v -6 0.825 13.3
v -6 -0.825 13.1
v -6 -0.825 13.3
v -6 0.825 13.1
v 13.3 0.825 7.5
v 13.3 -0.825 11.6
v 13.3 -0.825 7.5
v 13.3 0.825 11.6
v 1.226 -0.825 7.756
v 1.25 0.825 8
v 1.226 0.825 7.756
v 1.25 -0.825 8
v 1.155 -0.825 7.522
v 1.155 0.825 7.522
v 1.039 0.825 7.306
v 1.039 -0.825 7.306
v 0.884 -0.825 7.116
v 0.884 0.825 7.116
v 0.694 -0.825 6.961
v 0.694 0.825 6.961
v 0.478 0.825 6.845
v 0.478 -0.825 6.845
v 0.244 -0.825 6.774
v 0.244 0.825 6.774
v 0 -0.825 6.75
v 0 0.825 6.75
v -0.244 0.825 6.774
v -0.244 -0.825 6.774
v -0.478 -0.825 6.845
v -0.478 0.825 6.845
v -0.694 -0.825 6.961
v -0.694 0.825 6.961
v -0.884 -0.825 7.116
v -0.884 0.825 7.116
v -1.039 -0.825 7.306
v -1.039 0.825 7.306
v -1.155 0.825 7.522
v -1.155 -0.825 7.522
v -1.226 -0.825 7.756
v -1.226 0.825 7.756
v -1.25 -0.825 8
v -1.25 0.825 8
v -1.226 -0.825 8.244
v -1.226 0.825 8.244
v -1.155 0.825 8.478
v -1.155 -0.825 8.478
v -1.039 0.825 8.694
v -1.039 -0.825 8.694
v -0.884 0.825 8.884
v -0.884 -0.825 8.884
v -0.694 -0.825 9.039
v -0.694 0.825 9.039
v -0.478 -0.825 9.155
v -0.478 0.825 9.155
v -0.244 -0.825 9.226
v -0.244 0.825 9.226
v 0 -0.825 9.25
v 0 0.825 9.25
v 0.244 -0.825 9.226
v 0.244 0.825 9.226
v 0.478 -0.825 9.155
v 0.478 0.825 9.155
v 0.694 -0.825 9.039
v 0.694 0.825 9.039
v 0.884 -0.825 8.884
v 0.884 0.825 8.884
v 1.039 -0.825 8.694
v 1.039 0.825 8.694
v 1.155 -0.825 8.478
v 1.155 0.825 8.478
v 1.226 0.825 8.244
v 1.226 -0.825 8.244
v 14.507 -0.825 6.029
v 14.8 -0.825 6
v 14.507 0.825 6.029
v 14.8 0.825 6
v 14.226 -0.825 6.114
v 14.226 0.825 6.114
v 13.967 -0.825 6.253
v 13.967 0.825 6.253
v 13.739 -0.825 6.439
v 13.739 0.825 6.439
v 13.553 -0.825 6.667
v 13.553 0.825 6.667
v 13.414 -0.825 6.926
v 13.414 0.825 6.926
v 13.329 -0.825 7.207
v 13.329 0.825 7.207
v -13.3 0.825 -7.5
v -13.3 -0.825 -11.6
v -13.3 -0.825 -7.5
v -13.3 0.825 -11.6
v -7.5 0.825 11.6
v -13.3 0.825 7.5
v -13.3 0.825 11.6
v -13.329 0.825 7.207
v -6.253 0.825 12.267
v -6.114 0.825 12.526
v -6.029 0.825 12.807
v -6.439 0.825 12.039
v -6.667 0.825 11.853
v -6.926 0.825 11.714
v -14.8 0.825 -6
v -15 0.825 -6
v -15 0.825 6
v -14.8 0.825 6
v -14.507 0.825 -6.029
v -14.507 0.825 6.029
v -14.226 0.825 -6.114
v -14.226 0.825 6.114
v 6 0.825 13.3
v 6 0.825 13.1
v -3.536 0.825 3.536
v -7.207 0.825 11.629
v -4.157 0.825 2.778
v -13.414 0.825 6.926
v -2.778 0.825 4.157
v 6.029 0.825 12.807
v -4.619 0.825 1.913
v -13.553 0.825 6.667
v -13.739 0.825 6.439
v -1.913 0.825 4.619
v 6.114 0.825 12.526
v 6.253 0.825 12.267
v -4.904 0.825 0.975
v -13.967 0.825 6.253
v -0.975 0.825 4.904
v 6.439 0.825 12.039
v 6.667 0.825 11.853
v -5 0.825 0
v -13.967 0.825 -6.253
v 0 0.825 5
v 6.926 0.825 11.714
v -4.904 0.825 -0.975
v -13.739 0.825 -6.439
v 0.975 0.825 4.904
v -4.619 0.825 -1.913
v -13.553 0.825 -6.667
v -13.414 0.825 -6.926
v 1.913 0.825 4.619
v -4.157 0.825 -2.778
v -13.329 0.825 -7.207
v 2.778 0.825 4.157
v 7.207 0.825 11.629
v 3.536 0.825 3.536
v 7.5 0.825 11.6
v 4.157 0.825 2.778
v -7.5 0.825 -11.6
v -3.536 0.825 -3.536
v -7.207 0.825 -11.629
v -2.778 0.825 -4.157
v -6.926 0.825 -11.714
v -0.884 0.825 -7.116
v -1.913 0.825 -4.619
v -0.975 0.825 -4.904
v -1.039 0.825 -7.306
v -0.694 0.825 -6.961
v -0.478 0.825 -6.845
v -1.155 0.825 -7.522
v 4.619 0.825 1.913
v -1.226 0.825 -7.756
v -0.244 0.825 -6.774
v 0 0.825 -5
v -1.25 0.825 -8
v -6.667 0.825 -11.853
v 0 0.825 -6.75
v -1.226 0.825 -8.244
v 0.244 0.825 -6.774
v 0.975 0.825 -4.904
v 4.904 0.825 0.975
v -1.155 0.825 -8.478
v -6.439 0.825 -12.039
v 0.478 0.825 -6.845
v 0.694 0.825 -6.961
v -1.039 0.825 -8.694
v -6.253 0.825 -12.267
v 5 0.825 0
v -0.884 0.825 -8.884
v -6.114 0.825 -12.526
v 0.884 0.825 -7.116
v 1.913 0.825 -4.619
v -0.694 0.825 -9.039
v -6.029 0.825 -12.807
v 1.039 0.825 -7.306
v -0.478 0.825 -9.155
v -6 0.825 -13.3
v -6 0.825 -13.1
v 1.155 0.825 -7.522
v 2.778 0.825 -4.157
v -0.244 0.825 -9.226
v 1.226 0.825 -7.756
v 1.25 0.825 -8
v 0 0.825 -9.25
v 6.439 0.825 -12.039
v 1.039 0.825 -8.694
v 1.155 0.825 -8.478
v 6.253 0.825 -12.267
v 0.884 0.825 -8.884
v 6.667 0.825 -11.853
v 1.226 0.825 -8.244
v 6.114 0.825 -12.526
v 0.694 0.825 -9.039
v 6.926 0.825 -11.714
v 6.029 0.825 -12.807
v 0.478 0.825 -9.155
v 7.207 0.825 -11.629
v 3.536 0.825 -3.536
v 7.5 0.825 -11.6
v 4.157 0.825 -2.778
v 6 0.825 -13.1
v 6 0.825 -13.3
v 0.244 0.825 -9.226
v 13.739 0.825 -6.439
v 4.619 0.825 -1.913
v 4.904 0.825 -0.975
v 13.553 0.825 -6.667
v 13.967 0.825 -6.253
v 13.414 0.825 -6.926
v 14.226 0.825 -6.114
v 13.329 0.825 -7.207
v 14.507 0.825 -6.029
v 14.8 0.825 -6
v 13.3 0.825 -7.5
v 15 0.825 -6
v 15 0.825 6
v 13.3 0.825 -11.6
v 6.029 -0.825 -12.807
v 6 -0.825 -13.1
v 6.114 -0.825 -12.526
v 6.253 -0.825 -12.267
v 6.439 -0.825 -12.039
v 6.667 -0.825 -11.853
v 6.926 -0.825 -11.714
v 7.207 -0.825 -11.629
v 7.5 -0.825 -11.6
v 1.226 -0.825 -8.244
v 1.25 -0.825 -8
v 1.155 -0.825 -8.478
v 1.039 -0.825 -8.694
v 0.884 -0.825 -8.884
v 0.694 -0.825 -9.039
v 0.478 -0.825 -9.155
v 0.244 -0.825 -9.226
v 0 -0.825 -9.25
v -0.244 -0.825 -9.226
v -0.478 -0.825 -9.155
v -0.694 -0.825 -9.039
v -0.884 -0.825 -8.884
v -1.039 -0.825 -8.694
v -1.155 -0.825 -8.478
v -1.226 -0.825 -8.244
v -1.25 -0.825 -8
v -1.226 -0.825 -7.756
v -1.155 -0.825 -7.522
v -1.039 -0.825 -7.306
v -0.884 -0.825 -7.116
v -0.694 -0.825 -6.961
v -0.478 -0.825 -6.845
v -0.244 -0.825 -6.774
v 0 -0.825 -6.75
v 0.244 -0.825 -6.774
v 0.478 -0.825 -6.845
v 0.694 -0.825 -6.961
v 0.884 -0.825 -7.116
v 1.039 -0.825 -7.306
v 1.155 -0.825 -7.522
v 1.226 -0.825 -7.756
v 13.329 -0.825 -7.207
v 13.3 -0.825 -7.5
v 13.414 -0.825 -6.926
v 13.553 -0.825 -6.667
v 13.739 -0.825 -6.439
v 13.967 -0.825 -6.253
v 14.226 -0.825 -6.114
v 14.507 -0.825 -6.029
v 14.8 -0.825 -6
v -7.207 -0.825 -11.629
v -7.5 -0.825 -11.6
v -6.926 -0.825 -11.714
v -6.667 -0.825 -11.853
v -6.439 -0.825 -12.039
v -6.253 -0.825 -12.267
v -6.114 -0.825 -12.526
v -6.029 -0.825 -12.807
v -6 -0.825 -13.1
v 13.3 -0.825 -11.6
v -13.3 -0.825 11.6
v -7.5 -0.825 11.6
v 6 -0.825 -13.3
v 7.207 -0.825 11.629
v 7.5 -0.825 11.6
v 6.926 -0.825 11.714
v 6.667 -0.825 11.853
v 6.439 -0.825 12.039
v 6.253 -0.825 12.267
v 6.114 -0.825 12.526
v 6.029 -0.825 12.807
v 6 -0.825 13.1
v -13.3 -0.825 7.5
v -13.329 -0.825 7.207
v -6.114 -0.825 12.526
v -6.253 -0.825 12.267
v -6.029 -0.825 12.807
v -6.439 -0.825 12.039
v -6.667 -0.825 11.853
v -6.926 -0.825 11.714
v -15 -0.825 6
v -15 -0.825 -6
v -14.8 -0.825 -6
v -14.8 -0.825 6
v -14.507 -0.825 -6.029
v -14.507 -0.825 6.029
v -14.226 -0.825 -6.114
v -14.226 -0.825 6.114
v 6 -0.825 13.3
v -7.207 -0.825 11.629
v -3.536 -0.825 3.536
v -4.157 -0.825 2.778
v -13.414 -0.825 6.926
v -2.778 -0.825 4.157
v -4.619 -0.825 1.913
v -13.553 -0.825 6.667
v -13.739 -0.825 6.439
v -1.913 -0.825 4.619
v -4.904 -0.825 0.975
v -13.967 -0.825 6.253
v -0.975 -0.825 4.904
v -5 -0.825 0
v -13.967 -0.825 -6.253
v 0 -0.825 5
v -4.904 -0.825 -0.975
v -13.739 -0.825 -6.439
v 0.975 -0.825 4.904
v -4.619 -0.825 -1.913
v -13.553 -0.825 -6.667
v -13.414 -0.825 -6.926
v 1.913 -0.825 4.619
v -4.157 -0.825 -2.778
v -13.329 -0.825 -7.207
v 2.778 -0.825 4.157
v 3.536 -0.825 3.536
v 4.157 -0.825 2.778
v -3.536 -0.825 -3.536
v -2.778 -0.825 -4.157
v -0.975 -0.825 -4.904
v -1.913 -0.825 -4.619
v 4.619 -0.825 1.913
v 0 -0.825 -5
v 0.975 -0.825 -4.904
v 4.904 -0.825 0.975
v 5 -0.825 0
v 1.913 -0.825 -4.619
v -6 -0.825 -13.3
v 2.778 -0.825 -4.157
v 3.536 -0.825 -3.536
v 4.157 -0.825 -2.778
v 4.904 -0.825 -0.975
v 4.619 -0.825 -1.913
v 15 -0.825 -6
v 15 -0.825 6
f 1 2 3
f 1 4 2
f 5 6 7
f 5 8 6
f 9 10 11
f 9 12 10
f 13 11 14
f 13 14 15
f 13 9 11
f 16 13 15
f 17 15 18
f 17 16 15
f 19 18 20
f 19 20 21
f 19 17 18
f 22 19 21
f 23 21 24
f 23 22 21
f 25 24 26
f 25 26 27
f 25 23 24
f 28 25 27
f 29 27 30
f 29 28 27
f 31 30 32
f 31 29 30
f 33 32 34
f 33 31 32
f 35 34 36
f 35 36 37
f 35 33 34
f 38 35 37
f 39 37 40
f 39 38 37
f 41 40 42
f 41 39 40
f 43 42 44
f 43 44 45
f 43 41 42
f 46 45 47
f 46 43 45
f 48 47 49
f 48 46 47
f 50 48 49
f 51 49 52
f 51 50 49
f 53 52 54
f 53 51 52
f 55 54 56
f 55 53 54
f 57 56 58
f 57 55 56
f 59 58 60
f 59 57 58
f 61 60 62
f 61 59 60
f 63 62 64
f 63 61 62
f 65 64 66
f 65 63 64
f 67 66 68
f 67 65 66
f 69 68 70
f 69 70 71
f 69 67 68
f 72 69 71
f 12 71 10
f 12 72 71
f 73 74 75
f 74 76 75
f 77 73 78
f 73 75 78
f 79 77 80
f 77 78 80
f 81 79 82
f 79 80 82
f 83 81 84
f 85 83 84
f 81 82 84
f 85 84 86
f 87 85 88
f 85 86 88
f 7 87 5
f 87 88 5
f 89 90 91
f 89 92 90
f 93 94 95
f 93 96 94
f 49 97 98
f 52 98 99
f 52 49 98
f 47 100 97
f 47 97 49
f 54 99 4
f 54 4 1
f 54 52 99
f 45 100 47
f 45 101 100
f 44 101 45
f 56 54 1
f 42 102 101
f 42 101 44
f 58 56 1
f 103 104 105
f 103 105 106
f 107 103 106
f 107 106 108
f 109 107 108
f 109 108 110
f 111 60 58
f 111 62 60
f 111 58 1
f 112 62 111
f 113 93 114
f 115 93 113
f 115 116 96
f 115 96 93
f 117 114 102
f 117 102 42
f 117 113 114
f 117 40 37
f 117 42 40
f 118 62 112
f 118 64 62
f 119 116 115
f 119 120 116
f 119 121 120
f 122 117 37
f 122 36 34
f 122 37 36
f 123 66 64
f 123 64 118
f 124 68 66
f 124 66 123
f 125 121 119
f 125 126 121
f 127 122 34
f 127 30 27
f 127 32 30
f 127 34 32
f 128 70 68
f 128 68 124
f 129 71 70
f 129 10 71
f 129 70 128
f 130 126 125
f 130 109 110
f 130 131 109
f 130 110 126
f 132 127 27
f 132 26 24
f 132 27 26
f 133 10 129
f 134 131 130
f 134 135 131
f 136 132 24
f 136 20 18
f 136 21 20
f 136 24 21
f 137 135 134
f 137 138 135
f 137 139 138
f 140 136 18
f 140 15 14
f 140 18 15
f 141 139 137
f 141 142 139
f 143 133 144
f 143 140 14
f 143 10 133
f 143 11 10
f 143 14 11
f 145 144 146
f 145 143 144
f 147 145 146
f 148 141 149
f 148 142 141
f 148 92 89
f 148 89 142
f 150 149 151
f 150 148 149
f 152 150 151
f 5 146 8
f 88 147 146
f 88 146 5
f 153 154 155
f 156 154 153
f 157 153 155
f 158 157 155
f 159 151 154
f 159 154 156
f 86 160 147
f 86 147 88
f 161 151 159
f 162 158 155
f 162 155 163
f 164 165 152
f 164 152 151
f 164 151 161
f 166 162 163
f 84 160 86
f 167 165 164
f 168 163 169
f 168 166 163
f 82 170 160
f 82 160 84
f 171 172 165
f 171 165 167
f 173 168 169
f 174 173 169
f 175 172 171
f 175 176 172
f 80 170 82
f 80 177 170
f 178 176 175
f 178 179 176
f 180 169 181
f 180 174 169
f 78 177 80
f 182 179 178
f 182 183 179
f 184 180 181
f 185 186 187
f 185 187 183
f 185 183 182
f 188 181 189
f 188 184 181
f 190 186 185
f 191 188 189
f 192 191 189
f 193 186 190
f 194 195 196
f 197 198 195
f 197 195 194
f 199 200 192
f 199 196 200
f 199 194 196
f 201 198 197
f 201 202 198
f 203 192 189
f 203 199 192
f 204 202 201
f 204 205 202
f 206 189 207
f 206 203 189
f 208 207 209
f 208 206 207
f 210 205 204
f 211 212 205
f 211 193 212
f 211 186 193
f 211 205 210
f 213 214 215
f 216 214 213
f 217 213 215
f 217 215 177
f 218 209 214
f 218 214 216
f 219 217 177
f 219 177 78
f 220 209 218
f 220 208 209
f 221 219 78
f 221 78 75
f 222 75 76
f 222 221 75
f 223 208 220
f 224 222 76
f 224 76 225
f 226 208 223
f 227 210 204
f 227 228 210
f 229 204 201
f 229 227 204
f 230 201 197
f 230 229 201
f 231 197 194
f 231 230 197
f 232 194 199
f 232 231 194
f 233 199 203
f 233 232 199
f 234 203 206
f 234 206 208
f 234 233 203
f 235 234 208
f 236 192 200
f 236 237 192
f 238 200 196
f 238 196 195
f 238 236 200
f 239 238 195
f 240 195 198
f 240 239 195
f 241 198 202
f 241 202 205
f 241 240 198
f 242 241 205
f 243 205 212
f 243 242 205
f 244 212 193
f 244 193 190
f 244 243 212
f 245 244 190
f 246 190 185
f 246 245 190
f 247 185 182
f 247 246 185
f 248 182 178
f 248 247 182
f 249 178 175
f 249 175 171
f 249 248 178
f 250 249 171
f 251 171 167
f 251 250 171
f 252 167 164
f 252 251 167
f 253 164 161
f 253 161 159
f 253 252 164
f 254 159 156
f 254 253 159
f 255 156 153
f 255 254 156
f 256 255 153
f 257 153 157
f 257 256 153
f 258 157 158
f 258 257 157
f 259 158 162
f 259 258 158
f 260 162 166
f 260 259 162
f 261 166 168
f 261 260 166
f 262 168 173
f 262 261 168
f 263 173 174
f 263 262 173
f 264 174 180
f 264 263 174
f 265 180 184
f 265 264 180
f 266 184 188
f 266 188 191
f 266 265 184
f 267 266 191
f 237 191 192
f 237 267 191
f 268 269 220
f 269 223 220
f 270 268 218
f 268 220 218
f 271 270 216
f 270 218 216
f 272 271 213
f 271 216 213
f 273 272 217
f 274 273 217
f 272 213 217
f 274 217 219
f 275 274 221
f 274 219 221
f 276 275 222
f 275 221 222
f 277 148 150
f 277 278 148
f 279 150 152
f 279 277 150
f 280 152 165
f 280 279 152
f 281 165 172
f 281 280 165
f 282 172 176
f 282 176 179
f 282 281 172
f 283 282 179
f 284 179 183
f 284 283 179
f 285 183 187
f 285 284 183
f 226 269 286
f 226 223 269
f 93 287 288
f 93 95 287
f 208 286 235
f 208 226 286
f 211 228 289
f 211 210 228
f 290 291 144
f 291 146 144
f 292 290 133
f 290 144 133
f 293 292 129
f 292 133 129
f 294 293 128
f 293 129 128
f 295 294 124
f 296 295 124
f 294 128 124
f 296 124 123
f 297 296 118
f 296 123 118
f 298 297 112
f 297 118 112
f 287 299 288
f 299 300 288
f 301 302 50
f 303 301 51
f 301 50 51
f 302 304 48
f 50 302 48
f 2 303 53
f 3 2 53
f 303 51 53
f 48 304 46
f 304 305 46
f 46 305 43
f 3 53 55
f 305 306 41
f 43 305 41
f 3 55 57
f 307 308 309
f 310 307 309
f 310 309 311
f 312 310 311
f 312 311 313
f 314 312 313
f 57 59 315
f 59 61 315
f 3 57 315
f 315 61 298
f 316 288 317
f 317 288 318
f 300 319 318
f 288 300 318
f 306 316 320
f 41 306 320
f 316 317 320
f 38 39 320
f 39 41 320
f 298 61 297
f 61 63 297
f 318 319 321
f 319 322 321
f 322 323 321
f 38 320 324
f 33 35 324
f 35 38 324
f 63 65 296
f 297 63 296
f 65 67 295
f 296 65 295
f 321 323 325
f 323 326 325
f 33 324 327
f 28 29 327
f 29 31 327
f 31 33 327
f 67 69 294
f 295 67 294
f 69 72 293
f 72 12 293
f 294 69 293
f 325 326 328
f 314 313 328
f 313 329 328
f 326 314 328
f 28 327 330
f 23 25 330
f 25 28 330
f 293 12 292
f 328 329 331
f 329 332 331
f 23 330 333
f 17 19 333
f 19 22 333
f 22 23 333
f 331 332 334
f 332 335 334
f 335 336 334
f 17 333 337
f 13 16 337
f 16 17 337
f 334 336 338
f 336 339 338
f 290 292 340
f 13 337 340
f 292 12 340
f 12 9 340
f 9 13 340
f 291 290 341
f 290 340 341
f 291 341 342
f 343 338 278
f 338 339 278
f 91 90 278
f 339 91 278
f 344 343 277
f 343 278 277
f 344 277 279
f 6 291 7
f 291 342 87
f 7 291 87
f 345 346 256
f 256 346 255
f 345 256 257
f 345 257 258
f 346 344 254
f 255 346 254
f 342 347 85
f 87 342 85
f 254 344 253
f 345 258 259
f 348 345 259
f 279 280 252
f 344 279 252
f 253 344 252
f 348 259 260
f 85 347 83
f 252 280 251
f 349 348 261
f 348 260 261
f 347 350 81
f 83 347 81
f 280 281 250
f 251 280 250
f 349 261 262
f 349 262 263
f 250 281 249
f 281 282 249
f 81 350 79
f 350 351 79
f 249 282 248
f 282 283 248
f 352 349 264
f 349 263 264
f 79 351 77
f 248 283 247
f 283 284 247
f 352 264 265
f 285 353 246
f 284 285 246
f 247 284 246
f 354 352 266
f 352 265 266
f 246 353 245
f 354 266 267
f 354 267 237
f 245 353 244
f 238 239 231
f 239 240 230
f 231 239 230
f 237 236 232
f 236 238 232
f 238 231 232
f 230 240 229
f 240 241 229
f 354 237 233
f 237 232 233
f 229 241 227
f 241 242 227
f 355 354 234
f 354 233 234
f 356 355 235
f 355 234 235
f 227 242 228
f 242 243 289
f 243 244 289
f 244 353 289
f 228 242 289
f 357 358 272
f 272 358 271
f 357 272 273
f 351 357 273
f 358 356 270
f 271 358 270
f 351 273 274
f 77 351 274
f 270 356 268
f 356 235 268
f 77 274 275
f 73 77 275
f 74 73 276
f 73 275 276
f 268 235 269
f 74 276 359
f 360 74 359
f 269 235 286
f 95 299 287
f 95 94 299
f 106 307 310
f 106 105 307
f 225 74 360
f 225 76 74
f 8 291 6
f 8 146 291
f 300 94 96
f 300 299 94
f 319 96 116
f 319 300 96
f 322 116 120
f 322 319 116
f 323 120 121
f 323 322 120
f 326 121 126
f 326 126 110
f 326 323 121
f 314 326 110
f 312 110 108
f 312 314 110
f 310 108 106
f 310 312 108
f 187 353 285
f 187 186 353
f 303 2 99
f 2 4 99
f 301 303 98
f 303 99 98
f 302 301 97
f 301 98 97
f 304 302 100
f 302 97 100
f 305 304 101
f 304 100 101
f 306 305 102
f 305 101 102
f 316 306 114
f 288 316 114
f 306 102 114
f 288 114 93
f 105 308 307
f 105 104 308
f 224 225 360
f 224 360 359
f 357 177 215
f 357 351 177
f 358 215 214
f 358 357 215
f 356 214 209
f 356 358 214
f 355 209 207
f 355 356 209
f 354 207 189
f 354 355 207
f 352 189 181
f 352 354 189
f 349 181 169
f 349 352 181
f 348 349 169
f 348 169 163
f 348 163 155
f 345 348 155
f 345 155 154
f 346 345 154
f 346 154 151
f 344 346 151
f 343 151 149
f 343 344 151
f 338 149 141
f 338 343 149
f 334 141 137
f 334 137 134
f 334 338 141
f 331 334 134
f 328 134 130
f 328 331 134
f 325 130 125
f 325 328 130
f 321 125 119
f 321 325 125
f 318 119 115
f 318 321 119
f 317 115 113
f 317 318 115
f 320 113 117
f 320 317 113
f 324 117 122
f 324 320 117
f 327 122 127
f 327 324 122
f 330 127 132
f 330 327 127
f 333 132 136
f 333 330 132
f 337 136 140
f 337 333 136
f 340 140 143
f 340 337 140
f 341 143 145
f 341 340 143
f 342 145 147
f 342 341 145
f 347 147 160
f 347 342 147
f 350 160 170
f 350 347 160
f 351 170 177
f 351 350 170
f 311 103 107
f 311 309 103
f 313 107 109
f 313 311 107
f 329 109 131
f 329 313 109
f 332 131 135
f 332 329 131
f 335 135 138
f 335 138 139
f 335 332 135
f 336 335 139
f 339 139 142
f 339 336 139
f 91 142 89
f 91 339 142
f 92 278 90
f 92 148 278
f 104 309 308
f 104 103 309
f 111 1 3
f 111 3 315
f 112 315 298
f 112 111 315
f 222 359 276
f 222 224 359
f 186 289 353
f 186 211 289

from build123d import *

# Parameters (mm, degrees)
SKIZZE1_R                       = 1.25
SKIZZE1_R_2                     = 5
AUFSATZ_LINEAR_AUSTRAGEN1_DEPTH = 0.825
VERRUNDUNG1_R                   = 1.5


with BuildPart() as part:
    # Skizze1 → Aufsatz-Linear austragen1 (new body, symmetric)
    with BuildSketch(Plane(origin=(0, 0, 0), x_dir=(1, 0, 0), z_dir=(0, 1, 0))):
        Polygon((-13.3, -6), (-13.3, -11.6), (-6, -11.6), (-6, -13.3), (6, -13.3), (6, -11.6), (13.3, -11.6), (13.3, -6), (15, -6), (15, 6), (13.3, 6), (13.3, 11.6), (6, 11.6), (6, 13.3), (-6, 13.3), (-6, 11.6), (-13.3, 11.6), (-13.3, 6), (-15, 6), (-15, -6), align=None)
        with Locations((0, -8)):
            Circle(SKIZZE1_R, mode=Mode.SUBTRACT)
        with Locations((0, 8)):
            Circle(SKIZZE1_R, mode=Mode.SUBTRACT)
        Circle(SKIZZE1_R_2, mode=Mode.SUBTRACT)
    extrude(amount=AUFSATZ_LINEAR_AUSTRAGEN1_DEPTH, both=True)

    # Verrundung1
    verrundung1_edges = [part.edges().sort_by_distance(p)[0] for p in [
        (-6, 0, 11.6),
        (-13.3, 0, 6),
        (-13.3, 0, -6),
        (-6, 0, -11.6),
        (6, 0, -11.6),
        (13.3, 0, -6),
        (13.3, 0, 6),
        (6, 0, 11.6),
    ]]
    fillet(verrundung1_edges, radius=VERRUNDUNG1_R)


solid = part.part
